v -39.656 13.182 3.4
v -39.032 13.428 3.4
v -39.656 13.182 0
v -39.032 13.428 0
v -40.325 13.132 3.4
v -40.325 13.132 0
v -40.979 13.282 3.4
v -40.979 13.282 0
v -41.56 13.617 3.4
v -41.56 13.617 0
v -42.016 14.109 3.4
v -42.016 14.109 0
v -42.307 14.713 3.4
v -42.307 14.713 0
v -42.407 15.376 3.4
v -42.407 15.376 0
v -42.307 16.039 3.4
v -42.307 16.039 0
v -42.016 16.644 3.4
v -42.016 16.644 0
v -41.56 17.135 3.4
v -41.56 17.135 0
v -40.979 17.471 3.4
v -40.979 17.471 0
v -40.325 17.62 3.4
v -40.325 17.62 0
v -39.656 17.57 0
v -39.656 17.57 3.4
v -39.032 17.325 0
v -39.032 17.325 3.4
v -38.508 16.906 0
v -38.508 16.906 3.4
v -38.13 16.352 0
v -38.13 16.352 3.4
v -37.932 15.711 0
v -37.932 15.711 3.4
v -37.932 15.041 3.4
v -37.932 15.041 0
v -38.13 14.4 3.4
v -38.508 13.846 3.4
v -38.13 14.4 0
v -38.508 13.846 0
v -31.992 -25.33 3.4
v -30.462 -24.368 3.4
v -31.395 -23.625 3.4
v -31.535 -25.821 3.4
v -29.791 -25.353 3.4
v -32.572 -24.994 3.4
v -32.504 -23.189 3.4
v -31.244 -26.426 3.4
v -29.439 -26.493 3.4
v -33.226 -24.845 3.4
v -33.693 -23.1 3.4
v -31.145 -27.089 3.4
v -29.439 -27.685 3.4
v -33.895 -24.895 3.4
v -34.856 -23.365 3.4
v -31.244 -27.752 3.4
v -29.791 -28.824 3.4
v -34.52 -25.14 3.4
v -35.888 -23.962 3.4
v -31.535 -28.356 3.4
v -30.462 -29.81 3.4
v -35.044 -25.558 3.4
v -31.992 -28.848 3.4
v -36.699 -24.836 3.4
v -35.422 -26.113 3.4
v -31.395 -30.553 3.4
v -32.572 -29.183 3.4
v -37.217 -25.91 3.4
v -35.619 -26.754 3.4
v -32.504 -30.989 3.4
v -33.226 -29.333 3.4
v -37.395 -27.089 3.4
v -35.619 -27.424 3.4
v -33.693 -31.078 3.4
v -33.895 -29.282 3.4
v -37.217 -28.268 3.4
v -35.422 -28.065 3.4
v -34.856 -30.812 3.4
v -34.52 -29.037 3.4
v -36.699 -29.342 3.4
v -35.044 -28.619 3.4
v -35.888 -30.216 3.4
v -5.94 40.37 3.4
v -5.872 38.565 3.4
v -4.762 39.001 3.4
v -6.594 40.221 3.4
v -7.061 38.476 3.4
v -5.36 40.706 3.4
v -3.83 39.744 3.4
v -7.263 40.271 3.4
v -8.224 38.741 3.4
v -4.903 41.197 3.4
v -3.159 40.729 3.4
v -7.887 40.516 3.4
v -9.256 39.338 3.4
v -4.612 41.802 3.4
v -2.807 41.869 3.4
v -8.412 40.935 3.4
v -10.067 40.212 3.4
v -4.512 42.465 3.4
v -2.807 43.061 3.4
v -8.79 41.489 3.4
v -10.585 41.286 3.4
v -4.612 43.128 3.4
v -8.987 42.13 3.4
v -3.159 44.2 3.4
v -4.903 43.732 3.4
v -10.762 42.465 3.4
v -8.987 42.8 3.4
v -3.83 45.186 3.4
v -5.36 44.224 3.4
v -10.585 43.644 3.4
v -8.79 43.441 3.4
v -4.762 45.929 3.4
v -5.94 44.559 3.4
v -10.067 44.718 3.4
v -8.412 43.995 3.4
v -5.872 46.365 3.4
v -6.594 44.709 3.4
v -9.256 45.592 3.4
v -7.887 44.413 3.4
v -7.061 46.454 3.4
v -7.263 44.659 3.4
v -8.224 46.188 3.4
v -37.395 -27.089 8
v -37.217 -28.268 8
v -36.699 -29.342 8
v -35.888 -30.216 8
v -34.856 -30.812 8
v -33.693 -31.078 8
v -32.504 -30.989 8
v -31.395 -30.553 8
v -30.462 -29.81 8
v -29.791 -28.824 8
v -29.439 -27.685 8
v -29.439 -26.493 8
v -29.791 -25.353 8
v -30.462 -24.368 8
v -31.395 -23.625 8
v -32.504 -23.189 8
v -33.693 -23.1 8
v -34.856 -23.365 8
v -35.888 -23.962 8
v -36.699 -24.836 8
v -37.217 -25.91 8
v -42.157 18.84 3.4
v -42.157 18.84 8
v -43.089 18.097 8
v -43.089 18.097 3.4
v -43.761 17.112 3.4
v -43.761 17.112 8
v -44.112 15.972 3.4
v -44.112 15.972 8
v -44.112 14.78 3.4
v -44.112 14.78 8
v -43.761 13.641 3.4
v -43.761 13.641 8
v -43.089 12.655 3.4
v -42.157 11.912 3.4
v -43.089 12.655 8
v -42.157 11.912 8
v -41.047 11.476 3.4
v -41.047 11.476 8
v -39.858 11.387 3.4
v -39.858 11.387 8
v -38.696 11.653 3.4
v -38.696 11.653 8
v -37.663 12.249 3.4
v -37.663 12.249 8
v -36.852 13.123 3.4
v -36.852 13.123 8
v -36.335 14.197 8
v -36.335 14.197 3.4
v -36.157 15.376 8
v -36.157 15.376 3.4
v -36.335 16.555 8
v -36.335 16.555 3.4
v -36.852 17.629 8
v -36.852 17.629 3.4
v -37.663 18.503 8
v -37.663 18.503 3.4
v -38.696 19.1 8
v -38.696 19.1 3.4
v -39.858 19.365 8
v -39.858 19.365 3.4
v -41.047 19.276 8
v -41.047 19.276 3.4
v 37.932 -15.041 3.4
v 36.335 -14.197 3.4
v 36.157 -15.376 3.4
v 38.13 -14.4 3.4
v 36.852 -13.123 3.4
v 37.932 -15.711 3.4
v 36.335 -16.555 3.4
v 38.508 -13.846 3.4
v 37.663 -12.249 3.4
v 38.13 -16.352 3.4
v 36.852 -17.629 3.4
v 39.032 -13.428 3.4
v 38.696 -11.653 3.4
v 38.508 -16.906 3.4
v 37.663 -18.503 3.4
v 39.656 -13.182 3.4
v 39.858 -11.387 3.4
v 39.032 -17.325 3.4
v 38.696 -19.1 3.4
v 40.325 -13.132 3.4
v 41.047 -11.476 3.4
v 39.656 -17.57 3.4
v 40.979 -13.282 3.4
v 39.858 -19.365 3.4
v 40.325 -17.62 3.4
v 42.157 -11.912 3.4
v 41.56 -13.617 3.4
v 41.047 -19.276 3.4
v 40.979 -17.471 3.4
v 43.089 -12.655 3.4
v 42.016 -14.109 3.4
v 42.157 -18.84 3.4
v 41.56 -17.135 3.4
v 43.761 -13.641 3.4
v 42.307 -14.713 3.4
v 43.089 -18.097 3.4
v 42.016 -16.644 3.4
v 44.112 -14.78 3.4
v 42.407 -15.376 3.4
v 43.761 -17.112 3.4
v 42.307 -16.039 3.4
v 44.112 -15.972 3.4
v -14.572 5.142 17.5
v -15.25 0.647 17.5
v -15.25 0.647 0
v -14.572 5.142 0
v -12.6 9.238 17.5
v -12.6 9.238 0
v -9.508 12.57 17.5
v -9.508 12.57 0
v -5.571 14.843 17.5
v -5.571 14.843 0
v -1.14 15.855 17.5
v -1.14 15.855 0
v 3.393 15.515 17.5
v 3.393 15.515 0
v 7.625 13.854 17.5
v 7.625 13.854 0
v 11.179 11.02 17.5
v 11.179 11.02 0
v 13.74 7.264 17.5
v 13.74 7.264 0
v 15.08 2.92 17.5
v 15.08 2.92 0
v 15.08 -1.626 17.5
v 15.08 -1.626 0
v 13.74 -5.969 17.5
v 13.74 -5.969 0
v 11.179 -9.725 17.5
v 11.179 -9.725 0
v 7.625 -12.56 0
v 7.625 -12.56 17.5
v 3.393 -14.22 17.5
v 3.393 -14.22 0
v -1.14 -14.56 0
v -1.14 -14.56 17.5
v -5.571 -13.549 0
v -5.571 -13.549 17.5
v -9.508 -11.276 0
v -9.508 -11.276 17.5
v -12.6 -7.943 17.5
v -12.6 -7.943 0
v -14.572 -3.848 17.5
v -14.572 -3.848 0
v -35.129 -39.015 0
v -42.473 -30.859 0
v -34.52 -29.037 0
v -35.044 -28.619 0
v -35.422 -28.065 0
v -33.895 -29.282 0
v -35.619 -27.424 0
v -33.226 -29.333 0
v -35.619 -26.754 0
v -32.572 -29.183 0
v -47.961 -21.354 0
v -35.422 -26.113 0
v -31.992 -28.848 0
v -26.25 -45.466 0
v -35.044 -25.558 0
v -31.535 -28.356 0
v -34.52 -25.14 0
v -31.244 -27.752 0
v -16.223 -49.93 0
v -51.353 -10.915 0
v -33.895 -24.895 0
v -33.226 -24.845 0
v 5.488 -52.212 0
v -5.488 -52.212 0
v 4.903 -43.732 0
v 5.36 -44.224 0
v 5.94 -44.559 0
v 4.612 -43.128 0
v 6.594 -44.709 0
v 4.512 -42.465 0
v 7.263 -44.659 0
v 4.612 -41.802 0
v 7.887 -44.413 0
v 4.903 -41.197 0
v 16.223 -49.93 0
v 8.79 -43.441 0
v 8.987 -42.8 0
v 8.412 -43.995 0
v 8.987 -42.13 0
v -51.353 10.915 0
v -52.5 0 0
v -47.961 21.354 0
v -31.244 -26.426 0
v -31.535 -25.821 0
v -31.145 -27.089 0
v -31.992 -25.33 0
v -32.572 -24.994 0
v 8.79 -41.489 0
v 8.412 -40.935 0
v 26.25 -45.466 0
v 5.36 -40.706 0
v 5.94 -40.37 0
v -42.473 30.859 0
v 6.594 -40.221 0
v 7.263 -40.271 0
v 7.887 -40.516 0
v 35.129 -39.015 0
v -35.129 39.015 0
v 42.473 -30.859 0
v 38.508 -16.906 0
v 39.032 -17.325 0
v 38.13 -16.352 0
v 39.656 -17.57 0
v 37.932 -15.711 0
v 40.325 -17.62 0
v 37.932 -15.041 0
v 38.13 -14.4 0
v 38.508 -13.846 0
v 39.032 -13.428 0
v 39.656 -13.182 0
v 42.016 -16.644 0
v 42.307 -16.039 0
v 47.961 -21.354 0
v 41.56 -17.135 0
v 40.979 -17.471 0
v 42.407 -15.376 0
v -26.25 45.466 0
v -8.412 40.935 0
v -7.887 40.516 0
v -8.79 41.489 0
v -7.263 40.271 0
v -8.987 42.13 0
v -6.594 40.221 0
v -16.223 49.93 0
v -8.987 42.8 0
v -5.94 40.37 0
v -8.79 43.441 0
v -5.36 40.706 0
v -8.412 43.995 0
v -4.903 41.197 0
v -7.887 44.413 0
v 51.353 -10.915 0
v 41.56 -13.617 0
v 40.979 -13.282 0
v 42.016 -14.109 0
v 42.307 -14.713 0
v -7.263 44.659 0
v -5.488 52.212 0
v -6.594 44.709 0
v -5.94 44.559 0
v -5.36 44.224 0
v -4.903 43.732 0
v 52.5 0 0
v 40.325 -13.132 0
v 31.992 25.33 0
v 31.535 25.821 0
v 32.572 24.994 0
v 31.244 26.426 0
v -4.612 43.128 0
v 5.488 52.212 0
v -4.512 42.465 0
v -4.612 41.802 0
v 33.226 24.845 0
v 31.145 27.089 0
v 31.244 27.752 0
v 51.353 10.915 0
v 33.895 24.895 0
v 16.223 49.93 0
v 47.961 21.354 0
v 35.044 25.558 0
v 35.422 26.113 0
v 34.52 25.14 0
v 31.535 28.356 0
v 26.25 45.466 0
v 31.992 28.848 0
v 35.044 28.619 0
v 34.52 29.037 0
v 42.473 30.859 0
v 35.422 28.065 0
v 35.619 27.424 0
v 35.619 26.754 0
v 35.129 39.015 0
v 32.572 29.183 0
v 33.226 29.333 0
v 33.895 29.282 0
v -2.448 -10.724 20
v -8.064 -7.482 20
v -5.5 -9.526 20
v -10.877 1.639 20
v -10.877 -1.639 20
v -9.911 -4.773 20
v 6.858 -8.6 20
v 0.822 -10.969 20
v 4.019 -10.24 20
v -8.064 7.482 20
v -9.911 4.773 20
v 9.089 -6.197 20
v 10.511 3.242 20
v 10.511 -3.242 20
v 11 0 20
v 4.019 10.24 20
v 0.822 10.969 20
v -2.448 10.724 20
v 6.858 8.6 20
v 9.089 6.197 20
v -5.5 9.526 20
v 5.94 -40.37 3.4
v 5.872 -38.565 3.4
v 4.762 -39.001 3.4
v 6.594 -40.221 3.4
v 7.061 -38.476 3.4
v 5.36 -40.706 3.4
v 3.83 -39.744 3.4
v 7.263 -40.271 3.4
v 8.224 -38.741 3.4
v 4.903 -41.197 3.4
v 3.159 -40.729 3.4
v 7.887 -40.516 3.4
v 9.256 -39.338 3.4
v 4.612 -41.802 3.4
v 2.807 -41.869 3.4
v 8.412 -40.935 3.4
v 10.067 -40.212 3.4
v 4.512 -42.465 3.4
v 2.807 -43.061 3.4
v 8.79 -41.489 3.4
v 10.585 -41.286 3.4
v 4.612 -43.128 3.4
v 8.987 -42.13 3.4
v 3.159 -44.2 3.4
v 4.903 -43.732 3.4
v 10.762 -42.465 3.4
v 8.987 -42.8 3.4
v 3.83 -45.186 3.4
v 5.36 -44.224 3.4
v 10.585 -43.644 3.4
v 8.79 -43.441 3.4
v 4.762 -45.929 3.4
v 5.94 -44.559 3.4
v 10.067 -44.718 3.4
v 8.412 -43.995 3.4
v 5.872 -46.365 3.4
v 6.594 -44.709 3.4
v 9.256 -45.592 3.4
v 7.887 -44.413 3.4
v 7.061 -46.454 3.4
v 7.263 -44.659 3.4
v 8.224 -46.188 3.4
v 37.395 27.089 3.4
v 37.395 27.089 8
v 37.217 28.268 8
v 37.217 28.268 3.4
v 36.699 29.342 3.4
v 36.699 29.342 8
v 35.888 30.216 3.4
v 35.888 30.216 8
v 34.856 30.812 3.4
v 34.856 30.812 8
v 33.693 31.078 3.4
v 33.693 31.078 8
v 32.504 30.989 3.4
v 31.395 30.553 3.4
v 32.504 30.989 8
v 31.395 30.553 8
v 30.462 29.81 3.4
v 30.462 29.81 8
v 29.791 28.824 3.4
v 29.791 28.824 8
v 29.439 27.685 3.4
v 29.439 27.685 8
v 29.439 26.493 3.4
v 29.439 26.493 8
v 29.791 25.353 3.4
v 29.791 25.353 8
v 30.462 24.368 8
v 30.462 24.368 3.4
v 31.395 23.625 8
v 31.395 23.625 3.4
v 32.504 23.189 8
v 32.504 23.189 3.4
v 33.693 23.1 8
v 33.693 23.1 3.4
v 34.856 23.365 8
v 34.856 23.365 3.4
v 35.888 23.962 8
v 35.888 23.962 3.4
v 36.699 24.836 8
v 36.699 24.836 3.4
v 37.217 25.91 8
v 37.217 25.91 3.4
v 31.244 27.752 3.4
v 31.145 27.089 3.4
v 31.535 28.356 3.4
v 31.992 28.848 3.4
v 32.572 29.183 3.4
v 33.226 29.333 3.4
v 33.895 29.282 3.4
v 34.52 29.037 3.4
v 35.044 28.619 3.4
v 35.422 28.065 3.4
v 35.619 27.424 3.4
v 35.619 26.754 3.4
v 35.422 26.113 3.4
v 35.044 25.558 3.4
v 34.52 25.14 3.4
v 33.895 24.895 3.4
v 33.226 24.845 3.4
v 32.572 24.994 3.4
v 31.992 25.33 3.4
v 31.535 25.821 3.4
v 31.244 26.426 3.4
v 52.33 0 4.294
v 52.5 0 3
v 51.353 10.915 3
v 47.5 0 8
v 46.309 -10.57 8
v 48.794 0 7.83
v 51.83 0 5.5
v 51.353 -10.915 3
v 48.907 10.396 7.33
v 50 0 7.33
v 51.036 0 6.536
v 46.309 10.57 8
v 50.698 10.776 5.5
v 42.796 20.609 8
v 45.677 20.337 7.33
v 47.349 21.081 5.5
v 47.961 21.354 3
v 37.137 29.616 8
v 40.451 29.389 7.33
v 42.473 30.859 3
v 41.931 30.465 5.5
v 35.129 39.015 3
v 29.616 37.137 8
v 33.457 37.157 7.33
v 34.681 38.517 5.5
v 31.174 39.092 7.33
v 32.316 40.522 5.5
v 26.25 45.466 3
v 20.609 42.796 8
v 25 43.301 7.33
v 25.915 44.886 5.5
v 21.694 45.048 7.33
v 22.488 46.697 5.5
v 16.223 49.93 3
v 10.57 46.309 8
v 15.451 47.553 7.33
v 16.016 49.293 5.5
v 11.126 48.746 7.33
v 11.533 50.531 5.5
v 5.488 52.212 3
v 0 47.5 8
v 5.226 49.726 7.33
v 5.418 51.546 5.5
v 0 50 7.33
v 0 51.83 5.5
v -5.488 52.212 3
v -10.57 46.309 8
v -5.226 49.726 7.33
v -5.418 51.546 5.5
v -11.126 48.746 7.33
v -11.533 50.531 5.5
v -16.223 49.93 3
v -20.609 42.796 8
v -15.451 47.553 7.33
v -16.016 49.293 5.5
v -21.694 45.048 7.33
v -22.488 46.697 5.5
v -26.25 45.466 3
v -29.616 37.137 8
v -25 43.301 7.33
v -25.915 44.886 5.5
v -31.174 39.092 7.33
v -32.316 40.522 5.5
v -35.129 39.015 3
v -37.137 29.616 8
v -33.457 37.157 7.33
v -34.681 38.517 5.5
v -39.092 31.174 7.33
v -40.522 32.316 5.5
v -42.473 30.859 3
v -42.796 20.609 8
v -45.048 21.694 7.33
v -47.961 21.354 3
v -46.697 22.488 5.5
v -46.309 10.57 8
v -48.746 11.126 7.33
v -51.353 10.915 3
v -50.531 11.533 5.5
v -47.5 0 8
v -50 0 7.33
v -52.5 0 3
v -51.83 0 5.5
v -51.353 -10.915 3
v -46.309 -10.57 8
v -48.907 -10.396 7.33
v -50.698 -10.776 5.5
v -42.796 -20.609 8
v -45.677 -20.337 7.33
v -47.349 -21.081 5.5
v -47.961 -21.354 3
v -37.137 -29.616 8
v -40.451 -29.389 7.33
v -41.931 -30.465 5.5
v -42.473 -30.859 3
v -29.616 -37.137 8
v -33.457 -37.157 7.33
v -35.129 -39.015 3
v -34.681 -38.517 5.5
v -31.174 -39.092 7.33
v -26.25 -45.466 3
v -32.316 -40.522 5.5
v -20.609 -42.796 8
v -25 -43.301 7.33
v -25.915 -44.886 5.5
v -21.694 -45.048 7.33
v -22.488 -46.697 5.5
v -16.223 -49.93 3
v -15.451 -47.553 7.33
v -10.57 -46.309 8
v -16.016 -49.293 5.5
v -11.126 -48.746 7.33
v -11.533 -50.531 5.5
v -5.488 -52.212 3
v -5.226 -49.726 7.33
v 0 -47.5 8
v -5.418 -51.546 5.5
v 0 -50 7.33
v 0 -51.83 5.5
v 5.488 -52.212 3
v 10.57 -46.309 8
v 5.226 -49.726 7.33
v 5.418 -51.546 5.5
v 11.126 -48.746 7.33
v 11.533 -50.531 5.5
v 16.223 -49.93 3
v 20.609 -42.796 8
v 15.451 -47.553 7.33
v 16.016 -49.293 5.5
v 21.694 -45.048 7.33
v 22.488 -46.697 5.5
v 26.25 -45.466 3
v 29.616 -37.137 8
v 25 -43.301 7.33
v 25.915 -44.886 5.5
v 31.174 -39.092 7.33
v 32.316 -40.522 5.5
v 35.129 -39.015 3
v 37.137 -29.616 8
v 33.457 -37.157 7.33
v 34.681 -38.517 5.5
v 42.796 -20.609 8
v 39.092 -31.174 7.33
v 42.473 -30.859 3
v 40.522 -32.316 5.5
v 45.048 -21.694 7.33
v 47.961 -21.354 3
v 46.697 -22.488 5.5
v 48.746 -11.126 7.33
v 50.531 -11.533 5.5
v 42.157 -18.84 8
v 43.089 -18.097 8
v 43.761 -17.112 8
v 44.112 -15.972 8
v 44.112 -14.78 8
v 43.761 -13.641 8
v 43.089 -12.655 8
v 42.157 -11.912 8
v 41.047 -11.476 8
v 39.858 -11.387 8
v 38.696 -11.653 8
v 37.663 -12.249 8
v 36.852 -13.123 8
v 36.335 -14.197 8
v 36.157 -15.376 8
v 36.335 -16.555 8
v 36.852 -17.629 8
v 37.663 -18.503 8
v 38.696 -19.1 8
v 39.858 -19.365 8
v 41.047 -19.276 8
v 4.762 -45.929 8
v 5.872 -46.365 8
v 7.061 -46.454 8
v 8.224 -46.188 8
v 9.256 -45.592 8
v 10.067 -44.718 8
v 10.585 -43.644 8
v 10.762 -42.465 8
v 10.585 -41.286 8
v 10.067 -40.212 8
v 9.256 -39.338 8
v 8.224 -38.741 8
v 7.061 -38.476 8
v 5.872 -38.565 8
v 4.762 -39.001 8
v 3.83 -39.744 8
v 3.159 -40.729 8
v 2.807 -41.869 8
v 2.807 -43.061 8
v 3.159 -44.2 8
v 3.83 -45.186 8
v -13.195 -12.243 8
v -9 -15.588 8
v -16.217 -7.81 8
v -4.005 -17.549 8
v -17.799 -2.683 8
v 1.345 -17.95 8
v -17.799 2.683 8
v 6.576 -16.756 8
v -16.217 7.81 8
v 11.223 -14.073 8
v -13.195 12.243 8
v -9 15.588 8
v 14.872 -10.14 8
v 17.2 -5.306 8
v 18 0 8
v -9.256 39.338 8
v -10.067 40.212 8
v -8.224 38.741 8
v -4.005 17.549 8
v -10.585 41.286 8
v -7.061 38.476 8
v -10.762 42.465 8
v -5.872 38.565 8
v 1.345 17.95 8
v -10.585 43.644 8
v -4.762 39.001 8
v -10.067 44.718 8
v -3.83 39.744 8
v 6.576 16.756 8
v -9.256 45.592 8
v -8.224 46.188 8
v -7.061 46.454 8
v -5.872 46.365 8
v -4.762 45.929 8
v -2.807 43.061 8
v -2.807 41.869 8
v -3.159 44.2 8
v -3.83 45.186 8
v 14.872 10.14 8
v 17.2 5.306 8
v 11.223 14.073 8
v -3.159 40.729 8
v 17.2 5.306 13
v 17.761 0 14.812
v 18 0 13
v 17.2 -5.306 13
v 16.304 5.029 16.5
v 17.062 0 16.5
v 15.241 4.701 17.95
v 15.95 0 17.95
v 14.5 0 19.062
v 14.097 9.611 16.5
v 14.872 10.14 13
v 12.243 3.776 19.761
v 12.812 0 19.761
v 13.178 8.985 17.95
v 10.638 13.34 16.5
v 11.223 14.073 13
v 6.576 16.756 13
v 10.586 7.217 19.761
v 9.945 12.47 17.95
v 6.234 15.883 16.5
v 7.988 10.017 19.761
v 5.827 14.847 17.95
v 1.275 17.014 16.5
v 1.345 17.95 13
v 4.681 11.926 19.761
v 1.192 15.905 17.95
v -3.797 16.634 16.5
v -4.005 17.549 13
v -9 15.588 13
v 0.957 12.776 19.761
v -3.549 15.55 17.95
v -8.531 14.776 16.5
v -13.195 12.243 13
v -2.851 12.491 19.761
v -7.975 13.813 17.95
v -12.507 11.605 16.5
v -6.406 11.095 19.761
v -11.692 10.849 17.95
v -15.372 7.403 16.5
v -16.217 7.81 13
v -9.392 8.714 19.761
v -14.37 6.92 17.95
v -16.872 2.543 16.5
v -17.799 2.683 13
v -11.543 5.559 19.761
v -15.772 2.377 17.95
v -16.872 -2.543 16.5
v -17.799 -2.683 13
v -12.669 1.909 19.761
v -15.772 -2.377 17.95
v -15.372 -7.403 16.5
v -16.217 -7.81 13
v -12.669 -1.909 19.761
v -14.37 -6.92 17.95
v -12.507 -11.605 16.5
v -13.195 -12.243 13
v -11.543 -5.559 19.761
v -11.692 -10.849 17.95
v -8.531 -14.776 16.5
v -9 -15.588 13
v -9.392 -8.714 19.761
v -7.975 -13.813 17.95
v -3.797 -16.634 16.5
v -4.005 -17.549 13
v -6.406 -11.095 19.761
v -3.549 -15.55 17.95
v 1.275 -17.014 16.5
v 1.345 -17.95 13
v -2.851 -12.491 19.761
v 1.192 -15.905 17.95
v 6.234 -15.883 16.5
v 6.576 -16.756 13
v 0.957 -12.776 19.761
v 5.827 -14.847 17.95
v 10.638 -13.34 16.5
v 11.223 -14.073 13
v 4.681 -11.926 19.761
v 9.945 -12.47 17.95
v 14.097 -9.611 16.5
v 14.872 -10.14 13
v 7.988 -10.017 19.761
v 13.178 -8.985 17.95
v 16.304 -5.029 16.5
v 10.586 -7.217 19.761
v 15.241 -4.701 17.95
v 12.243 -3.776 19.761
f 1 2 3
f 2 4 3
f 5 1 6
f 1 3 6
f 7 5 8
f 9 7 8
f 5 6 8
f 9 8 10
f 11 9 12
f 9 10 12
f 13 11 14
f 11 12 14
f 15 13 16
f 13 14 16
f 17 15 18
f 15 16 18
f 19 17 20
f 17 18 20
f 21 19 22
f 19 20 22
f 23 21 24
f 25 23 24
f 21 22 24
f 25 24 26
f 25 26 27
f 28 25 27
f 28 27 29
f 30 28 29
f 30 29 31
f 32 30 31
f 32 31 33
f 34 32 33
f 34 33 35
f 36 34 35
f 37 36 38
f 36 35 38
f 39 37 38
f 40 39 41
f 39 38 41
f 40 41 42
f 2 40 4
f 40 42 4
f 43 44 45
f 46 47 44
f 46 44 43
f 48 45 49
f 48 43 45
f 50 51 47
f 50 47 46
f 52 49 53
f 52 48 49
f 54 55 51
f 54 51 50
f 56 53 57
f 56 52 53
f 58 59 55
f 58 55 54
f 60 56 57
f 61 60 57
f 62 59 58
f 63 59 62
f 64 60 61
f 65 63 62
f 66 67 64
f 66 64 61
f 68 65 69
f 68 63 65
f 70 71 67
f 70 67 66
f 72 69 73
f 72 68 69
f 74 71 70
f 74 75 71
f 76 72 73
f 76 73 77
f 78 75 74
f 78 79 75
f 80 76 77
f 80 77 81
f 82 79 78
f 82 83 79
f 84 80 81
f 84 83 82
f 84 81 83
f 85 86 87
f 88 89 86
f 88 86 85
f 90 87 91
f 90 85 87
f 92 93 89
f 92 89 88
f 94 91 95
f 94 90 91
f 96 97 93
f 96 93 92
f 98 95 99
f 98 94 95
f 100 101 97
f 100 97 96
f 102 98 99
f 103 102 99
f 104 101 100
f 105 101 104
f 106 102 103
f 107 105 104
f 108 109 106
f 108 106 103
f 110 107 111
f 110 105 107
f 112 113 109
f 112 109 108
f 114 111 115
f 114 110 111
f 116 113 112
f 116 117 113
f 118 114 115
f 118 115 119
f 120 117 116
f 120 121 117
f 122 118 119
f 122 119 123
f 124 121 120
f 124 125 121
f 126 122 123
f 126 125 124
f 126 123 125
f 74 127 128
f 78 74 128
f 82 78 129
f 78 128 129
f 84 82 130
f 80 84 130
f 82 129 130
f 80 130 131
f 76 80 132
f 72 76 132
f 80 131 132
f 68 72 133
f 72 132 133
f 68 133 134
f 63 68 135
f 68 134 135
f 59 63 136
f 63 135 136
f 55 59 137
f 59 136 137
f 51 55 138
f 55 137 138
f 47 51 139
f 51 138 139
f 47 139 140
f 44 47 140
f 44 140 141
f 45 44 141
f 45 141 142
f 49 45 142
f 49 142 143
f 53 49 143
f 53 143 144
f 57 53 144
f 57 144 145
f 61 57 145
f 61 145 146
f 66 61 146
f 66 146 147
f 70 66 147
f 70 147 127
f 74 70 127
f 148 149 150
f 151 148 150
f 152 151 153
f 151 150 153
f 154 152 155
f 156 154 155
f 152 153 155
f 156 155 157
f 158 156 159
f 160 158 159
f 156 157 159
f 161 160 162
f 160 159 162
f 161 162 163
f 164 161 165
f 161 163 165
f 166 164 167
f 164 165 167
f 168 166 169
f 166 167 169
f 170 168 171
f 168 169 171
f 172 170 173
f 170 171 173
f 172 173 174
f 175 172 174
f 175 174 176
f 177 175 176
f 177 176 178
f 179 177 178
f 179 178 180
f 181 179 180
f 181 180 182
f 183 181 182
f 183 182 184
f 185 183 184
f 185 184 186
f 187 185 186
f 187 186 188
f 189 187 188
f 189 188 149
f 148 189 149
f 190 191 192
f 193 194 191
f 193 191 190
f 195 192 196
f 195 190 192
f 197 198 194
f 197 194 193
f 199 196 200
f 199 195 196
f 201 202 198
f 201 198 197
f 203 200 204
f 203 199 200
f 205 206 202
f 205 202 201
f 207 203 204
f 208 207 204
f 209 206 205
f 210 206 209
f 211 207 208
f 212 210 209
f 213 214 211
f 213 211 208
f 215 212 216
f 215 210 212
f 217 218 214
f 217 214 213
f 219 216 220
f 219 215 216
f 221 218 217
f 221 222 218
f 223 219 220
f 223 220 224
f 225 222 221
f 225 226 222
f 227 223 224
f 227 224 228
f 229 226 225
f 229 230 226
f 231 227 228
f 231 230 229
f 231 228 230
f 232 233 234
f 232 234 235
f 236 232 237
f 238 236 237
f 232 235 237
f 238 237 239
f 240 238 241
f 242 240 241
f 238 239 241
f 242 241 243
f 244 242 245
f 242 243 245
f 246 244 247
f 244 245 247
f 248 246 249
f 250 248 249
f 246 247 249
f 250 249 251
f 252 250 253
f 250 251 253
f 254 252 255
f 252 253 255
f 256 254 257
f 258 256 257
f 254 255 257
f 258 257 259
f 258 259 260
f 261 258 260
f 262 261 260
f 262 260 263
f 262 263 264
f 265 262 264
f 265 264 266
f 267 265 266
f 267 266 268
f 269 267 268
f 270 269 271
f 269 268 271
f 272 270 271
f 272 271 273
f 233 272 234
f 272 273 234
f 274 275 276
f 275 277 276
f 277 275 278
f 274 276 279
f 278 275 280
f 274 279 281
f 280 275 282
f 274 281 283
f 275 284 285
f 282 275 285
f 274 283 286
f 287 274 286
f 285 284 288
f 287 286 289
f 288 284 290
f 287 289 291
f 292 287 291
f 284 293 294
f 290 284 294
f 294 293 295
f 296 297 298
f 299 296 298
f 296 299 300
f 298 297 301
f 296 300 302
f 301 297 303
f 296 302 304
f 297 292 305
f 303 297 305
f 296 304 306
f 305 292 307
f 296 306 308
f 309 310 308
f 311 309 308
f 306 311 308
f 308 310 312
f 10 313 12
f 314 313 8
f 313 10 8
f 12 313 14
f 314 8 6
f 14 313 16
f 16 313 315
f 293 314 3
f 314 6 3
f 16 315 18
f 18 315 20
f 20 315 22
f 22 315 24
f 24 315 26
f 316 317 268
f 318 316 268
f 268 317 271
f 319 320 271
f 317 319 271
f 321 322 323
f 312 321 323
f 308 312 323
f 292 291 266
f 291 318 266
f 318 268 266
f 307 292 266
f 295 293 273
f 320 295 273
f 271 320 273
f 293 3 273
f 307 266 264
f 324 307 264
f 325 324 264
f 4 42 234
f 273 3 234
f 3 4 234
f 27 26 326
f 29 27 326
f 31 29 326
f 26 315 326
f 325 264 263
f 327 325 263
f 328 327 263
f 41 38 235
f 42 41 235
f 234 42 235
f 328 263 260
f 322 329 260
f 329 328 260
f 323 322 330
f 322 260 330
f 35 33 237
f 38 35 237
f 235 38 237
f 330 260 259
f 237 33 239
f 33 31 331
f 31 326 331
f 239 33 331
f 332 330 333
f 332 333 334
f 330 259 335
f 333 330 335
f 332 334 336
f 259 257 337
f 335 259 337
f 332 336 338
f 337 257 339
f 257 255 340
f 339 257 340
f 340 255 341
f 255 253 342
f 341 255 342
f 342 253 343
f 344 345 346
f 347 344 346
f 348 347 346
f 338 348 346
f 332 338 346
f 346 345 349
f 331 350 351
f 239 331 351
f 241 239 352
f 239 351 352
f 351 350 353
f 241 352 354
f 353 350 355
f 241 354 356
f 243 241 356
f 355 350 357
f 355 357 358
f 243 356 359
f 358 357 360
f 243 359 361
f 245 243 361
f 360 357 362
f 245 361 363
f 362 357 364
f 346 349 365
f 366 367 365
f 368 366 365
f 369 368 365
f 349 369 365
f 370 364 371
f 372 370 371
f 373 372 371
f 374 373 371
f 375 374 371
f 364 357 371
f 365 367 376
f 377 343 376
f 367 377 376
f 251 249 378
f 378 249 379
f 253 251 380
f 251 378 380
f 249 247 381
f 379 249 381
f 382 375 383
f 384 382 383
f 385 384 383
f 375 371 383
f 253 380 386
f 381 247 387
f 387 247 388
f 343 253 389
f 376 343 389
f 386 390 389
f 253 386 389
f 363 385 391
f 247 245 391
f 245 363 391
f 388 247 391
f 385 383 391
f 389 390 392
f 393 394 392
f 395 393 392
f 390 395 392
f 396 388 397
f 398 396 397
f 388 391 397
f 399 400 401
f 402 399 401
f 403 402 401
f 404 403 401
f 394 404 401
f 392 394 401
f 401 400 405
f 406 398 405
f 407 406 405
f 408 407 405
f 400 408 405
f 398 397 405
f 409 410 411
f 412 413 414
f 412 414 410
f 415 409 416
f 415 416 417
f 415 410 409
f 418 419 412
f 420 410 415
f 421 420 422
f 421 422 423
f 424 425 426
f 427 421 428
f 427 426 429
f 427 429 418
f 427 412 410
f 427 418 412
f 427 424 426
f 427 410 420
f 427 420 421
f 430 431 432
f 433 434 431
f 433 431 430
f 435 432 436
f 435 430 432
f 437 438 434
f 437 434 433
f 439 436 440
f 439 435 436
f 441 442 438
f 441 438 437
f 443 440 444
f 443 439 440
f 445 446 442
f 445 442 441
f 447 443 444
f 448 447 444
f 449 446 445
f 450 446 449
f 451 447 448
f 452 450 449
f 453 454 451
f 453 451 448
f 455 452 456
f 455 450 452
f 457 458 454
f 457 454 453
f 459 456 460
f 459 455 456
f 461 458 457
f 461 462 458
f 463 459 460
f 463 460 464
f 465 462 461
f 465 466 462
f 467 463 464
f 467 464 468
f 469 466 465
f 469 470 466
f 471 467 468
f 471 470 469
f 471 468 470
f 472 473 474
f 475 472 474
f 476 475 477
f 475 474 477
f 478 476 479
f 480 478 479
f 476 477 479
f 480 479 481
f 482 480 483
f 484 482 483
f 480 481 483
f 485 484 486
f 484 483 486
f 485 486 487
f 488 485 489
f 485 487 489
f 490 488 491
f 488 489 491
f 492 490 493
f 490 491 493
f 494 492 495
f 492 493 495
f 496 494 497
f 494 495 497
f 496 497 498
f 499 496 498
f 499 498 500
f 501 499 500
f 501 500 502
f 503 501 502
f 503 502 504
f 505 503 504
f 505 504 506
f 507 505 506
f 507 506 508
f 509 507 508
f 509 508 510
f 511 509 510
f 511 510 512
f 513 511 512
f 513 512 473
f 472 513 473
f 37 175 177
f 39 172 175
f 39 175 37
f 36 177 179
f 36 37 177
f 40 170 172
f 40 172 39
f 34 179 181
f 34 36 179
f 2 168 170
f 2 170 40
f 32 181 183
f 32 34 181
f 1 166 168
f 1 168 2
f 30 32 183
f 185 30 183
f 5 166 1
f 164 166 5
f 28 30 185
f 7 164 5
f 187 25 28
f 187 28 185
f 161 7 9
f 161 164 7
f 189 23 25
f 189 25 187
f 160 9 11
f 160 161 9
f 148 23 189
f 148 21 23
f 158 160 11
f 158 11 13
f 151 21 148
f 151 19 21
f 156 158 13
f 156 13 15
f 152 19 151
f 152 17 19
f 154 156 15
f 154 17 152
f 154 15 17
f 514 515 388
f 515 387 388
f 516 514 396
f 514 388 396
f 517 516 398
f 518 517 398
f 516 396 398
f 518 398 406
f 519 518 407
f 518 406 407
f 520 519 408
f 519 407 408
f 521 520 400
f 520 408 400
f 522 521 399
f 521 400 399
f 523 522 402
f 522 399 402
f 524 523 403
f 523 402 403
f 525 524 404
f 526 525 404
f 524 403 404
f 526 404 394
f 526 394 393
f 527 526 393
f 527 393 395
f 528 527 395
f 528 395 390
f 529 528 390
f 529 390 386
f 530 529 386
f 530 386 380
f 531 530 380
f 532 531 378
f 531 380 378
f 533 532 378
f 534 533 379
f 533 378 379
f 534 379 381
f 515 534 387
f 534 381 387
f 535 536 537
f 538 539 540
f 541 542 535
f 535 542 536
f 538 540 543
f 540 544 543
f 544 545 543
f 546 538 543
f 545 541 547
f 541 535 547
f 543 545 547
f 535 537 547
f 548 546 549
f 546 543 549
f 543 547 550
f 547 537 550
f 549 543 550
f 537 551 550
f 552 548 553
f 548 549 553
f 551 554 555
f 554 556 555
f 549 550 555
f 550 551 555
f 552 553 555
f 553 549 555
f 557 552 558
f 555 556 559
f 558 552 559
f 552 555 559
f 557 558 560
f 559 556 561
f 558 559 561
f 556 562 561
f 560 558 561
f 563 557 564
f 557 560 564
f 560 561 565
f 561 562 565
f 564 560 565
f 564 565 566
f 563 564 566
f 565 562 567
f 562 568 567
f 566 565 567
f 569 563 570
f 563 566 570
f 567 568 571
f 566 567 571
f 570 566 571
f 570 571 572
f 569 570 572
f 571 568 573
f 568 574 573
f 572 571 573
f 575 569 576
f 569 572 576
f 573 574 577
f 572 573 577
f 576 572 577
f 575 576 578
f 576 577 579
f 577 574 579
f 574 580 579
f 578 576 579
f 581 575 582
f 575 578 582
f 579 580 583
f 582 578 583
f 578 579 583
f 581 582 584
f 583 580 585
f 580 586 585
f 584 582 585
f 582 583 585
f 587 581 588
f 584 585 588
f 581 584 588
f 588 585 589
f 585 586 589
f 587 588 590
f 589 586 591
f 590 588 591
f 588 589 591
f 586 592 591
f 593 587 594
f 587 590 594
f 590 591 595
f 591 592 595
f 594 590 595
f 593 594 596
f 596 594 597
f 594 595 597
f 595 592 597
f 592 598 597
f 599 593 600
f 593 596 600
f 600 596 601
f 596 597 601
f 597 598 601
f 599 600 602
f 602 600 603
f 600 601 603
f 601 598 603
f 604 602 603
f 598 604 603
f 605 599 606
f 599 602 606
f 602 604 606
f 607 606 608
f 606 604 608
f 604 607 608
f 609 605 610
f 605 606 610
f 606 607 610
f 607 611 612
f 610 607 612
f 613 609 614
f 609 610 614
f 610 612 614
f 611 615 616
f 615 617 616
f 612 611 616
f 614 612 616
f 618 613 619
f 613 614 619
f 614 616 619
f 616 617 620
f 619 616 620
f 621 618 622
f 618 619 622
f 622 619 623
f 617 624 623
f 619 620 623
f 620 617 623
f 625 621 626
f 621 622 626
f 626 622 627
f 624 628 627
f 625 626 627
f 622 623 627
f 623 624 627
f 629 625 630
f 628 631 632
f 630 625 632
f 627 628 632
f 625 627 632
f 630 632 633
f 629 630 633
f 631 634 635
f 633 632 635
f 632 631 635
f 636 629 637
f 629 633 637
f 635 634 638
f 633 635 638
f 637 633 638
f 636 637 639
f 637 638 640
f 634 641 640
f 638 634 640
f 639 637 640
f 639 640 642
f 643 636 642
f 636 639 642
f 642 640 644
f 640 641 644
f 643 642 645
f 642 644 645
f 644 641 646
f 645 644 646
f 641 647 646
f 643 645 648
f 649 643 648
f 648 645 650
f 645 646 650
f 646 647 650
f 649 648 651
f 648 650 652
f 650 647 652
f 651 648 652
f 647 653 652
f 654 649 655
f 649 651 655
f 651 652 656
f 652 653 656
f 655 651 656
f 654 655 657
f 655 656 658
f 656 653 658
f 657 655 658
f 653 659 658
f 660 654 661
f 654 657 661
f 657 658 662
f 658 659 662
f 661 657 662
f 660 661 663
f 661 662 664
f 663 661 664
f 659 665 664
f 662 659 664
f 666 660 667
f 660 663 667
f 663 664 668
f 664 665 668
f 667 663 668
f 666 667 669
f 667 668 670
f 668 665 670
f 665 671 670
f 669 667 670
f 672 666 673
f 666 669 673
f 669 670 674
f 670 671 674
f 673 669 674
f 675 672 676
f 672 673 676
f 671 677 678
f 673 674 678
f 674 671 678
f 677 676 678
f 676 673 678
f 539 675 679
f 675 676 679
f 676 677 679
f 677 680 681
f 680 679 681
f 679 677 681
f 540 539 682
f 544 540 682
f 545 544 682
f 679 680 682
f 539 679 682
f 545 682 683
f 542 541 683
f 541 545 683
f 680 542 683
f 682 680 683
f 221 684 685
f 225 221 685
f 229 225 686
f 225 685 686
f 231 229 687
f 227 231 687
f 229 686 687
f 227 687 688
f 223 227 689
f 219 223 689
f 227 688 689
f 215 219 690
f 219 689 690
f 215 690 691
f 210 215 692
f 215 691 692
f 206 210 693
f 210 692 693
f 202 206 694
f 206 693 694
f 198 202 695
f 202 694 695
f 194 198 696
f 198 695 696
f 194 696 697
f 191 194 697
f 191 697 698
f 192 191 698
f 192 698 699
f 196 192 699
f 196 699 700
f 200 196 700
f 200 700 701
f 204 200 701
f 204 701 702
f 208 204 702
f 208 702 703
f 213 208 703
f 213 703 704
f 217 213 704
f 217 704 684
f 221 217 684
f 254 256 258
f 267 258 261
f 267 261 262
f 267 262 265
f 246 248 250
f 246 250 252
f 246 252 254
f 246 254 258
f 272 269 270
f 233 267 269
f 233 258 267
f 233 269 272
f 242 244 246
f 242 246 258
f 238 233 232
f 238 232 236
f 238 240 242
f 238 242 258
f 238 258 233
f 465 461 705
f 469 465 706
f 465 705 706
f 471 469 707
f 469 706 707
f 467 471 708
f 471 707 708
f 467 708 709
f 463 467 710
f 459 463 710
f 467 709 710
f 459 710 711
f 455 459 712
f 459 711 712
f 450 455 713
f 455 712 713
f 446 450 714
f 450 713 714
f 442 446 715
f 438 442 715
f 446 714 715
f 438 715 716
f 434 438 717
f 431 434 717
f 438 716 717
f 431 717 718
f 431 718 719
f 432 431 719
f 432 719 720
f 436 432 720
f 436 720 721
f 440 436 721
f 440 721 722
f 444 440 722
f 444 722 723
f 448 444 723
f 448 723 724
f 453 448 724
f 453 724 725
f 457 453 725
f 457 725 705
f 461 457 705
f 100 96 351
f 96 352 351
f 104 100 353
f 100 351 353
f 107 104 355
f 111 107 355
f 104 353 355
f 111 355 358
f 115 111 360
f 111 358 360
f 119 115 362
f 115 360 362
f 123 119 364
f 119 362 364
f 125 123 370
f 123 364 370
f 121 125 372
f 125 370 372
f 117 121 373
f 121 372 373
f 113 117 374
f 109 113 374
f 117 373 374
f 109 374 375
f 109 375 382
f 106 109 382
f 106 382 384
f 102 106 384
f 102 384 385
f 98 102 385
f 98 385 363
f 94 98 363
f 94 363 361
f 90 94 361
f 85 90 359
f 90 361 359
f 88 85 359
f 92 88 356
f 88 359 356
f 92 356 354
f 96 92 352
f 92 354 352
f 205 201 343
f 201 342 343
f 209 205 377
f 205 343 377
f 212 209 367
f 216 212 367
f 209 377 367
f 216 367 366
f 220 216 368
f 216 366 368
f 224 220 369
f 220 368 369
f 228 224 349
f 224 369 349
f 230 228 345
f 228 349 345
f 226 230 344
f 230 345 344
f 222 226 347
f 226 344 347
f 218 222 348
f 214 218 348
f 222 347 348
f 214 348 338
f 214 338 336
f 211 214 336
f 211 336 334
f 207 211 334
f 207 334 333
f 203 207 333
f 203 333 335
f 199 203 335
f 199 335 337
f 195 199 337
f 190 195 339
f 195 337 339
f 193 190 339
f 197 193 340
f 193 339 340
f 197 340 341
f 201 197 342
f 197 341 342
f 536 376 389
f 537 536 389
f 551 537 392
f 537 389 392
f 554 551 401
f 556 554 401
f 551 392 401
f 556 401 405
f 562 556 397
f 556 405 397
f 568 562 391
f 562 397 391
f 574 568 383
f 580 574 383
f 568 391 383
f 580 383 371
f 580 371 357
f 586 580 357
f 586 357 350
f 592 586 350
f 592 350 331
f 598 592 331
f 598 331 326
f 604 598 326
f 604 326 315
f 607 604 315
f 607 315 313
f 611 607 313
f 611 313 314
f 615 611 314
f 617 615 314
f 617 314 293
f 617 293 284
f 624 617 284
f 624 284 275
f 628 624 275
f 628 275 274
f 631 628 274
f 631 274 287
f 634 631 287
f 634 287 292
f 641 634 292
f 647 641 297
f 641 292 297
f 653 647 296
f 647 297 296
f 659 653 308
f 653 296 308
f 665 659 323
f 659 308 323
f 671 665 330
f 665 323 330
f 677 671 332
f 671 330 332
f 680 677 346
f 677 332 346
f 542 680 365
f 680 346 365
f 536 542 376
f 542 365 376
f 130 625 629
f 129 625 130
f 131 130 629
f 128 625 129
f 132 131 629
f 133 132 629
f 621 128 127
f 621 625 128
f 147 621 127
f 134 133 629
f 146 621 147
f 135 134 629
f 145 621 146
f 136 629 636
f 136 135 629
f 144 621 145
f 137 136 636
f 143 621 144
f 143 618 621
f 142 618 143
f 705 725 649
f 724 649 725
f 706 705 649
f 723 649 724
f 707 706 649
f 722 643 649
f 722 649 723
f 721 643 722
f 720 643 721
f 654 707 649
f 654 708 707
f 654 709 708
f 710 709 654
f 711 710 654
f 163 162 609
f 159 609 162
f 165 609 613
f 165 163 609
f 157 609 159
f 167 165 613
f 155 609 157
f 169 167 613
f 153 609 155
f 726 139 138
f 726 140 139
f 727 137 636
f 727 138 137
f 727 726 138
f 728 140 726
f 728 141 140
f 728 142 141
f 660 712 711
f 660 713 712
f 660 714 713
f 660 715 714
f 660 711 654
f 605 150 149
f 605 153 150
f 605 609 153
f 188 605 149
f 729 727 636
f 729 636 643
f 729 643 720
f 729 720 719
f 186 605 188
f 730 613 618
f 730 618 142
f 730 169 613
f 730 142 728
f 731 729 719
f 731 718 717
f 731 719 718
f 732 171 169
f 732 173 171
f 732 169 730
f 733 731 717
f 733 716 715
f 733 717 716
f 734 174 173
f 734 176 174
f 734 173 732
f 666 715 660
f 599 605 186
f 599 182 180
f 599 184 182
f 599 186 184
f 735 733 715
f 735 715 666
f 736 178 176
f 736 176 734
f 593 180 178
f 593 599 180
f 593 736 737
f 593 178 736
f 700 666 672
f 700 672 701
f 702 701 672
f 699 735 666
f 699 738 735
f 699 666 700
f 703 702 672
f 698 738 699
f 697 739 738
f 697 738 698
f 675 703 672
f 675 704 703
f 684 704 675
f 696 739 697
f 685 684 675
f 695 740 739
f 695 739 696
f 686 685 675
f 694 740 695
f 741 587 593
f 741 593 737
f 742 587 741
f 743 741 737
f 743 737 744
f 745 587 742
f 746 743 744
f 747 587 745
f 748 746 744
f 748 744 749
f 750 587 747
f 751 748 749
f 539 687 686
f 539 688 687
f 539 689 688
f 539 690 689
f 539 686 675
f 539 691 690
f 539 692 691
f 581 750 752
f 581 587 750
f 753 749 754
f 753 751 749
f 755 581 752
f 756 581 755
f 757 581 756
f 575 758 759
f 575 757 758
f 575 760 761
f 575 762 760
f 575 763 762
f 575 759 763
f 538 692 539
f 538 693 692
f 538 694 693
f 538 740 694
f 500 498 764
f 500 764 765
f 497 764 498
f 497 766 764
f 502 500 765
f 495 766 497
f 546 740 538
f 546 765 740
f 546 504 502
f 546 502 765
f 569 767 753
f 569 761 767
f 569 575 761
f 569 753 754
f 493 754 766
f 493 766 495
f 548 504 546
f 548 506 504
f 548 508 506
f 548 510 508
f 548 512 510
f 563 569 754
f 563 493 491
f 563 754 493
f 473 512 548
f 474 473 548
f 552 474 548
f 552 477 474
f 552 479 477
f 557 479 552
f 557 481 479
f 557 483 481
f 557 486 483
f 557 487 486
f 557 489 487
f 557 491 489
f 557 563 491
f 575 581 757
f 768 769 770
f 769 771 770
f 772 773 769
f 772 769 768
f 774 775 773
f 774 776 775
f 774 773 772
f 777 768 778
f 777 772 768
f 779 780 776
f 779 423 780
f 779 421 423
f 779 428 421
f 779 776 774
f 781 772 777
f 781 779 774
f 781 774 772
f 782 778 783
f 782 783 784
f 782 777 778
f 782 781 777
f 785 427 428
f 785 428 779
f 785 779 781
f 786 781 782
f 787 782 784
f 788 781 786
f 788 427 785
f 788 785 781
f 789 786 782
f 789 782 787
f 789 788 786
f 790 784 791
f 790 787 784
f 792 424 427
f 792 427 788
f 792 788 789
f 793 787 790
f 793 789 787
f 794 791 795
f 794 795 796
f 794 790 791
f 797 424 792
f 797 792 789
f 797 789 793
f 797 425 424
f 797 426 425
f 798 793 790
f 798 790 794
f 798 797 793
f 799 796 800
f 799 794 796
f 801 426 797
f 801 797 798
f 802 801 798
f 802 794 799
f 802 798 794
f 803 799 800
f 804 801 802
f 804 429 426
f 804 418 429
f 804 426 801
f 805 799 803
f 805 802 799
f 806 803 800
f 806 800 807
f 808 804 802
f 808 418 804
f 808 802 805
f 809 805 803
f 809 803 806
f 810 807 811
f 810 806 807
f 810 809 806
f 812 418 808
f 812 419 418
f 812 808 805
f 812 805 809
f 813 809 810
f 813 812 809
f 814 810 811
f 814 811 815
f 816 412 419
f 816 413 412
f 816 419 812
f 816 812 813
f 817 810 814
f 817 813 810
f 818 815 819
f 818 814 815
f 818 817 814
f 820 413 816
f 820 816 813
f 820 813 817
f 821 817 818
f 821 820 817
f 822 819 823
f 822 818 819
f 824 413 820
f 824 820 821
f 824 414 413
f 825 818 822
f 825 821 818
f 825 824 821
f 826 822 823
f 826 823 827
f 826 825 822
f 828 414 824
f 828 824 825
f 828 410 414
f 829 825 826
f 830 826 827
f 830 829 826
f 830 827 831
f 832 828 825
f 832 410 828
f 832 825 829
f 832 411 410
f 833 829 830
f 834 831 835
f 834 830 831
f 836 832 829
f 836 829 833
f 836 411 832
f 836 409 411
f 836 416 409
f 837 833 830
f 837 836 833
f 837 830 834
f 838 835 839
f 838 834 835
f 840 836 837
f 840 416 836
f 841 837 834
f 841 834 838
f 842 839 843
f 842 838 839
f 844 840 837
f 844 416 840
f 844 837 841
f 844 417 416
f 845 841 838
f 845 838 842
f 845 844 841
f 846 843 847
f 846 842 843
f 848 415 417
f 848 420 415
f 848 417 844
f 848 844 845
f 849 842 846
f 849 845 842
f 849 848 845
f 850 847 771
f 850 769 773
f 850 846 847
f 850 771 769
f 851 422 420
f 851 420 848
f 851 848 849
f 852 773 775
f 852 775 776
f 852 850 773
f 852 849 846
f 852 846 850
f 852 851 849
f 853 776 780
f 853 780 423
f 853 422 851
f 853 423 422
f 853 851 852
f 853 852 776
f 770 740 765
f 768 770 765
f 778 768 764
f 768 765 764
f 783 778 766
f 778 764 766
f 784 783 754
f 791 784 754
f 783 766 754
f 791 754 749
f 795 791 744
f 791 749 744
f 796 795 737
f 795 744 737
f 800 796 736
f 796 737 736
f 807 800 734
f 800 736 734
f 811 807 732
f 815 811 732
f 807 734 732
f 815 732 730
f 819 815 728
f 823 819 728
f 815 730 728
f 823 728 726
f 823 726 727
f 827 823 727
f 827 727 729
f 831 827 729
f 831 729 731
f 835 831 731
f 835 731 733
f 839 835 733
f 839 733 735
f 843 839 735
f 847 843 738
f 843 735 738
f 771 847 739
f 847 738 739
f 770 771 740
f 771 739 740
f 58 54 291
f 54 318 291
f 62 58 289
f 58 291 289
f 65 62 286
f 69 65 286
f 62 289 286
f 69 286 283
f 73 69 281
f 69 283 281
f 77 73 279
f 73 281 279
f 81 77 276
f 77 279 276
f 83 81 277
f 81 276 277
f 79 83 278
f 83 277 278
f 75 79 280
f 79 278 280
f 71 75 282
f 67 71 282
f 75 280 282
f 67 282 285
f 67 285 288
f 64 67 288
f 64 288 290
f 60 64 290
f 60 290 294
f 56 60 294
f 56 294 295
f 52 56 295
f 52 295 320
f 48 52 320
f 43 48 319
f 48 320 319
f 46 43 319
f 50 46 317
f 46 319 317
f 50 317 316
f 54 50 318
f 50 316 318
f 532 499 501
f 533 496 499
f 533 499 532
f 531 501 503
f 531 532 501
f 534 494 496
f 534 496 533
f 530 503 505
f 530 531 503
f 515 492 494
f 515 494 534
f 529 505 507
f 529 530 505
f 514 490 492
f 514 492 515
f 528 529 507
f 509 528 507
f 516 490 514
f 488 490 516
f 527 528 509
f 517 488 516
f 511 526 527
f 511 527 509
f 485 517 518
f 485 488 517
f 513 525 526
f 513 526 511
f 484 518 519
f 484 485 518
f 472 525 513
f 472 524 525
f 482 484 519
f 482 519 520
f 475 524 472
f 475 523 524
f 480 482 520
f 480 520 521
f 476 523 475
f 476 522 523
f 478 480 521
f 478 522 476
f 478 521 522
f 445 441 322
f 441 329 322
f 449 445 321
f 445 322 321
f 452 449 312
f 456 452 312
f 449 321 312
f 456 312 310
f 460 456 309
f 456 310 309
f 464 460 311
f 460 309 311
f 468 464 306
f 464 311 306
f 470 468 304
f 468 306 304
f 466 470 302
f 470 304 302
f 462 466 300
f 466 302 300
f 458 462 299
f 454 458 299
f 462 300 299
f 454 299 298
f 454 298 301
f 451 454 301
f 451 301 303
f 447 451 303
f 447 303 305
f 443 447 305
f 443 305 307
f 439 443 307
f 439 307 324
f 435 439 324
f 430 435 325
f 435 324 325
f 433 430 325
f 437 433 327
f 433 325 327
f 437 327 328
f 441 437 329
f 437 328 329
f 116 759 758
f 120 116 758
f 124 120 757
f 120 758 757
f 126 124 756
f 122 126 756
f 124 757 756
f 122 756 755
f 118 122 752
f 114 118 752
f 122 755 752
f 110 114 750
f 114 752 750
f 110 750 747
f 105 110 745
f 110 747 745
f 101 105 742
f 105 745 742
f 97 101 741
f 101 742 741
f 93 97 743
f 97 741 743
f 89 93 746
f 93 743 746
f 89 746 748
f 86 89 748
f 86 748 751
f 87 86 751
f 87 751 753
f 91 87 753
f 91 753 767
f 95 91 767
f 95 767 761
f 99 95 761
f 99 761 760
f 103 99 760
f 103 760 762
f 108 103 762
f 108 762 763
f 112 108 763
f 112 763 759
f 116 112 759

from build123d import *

# Parameters (mm, degrees)
SKETCH_1_R                   = 52.5
EXTRUDE_1_DEPTH              = 20
CUT_EXTRUDE_START            = -12
SKETCH_3_R                   = 52.5
SKETCH_3_R_2                 = 18
CUT_EXTRUDE_1_DEPTH          = 12
SKETCH_5_R                   = 15.25
CUT_EXTRUDE_3_DEPTH          = 17.5
HOLE_WIZARD_M4_1_D           = 4.5
HOLE_WIZARD_M4_1_CBORE_D     = 8
HOLE_WIZARD_M4_1_CBORE_DEPTH = 4.6
PATTERN_CIRCULAR_1_COUNT     = 6
FILLET_2_R                   = 7
FILLET_3_R                   = 5


with BuildPart() as part:
    # 草图1 → 凸台-拉伸1 (new body)
    with BuildSketch(Plane.XY):
        Circle(SKETCH_1_R)
    extrude(amount=EXTRUDE_1_DEPTH)

    # 草图3 → 切除-拉伸1 (cut)
    with BuildSketch(Plane.XY.offset(20).offset(CUT_EXTRUDE_START)):
        Circle(SKETCH_3_R)
        Circle(SKETCH_3_R_2, mode=Mode.SUBTRACT)
    extrude(amount=CUT_EXTRUDE_1_DEPTH, mode=Mode.SUBTRACT)

    # 草图5 → 切除-拉伸3 (cut)
    with BuildSketch(Plane(origin=(0, 0, 0), x_dir=(-1, 0, 0), z_dir=(0, 0, -1))):
        with Locations((0, 0.647267044)):
            Circle(SKETCH_5_R)
    extrude(amount=-CUT_EXTRUDE_3_DEPTH, mode=Mode.SUBTRACT)

    # M4 六角圆柱头螺钉的柱形沉头孔1 (through all)
    with Locations(Plane.XY.offset(8)):
        with Locations((33.394511176, 27.088865302)):
            hole_wizard_m4_1 = CounterBoreHole(HOLE_WIZARD_M4_1_D / 2, HOLE_WIZARD_M4_1_CBORE_D / 2, HOLE_WIZARD_M4_1_CBORE_DEPTH)

    # 阵列(圆周)1: M4 六角圆柱头螺钉的柱形沉头孔1 ×6 about axis
    pattern_circular_1_axis = Axis((0, 0, 0), (0, 0, 1))
    for i in range(1, PATTERN_CIRCULAR_1_COUNT):
        add(hole_wizard_m4_1.rotate(pattern_circular_1_axis, i * 360 / PATTERN_CIRCULAR_1_COUNT), mode=Mode.SUBTRACT)

    # 圆角2
    fillet_2_edges = [part.edges().sort_by_distance(p)[0] for p in [
        (-18, 0, 20),
    ]]
    fillet(fillet_2_edges, radius=FILLET_2_R)

    # 圆角3
    fillet_3_edges = [part.edges().sort_by_distance(p)[0] for p in [
        (-52.5, 0, 8),
    ]]
    fillet(fillet_3_edges, radius=FILLET_3_R)


solid = part.part
